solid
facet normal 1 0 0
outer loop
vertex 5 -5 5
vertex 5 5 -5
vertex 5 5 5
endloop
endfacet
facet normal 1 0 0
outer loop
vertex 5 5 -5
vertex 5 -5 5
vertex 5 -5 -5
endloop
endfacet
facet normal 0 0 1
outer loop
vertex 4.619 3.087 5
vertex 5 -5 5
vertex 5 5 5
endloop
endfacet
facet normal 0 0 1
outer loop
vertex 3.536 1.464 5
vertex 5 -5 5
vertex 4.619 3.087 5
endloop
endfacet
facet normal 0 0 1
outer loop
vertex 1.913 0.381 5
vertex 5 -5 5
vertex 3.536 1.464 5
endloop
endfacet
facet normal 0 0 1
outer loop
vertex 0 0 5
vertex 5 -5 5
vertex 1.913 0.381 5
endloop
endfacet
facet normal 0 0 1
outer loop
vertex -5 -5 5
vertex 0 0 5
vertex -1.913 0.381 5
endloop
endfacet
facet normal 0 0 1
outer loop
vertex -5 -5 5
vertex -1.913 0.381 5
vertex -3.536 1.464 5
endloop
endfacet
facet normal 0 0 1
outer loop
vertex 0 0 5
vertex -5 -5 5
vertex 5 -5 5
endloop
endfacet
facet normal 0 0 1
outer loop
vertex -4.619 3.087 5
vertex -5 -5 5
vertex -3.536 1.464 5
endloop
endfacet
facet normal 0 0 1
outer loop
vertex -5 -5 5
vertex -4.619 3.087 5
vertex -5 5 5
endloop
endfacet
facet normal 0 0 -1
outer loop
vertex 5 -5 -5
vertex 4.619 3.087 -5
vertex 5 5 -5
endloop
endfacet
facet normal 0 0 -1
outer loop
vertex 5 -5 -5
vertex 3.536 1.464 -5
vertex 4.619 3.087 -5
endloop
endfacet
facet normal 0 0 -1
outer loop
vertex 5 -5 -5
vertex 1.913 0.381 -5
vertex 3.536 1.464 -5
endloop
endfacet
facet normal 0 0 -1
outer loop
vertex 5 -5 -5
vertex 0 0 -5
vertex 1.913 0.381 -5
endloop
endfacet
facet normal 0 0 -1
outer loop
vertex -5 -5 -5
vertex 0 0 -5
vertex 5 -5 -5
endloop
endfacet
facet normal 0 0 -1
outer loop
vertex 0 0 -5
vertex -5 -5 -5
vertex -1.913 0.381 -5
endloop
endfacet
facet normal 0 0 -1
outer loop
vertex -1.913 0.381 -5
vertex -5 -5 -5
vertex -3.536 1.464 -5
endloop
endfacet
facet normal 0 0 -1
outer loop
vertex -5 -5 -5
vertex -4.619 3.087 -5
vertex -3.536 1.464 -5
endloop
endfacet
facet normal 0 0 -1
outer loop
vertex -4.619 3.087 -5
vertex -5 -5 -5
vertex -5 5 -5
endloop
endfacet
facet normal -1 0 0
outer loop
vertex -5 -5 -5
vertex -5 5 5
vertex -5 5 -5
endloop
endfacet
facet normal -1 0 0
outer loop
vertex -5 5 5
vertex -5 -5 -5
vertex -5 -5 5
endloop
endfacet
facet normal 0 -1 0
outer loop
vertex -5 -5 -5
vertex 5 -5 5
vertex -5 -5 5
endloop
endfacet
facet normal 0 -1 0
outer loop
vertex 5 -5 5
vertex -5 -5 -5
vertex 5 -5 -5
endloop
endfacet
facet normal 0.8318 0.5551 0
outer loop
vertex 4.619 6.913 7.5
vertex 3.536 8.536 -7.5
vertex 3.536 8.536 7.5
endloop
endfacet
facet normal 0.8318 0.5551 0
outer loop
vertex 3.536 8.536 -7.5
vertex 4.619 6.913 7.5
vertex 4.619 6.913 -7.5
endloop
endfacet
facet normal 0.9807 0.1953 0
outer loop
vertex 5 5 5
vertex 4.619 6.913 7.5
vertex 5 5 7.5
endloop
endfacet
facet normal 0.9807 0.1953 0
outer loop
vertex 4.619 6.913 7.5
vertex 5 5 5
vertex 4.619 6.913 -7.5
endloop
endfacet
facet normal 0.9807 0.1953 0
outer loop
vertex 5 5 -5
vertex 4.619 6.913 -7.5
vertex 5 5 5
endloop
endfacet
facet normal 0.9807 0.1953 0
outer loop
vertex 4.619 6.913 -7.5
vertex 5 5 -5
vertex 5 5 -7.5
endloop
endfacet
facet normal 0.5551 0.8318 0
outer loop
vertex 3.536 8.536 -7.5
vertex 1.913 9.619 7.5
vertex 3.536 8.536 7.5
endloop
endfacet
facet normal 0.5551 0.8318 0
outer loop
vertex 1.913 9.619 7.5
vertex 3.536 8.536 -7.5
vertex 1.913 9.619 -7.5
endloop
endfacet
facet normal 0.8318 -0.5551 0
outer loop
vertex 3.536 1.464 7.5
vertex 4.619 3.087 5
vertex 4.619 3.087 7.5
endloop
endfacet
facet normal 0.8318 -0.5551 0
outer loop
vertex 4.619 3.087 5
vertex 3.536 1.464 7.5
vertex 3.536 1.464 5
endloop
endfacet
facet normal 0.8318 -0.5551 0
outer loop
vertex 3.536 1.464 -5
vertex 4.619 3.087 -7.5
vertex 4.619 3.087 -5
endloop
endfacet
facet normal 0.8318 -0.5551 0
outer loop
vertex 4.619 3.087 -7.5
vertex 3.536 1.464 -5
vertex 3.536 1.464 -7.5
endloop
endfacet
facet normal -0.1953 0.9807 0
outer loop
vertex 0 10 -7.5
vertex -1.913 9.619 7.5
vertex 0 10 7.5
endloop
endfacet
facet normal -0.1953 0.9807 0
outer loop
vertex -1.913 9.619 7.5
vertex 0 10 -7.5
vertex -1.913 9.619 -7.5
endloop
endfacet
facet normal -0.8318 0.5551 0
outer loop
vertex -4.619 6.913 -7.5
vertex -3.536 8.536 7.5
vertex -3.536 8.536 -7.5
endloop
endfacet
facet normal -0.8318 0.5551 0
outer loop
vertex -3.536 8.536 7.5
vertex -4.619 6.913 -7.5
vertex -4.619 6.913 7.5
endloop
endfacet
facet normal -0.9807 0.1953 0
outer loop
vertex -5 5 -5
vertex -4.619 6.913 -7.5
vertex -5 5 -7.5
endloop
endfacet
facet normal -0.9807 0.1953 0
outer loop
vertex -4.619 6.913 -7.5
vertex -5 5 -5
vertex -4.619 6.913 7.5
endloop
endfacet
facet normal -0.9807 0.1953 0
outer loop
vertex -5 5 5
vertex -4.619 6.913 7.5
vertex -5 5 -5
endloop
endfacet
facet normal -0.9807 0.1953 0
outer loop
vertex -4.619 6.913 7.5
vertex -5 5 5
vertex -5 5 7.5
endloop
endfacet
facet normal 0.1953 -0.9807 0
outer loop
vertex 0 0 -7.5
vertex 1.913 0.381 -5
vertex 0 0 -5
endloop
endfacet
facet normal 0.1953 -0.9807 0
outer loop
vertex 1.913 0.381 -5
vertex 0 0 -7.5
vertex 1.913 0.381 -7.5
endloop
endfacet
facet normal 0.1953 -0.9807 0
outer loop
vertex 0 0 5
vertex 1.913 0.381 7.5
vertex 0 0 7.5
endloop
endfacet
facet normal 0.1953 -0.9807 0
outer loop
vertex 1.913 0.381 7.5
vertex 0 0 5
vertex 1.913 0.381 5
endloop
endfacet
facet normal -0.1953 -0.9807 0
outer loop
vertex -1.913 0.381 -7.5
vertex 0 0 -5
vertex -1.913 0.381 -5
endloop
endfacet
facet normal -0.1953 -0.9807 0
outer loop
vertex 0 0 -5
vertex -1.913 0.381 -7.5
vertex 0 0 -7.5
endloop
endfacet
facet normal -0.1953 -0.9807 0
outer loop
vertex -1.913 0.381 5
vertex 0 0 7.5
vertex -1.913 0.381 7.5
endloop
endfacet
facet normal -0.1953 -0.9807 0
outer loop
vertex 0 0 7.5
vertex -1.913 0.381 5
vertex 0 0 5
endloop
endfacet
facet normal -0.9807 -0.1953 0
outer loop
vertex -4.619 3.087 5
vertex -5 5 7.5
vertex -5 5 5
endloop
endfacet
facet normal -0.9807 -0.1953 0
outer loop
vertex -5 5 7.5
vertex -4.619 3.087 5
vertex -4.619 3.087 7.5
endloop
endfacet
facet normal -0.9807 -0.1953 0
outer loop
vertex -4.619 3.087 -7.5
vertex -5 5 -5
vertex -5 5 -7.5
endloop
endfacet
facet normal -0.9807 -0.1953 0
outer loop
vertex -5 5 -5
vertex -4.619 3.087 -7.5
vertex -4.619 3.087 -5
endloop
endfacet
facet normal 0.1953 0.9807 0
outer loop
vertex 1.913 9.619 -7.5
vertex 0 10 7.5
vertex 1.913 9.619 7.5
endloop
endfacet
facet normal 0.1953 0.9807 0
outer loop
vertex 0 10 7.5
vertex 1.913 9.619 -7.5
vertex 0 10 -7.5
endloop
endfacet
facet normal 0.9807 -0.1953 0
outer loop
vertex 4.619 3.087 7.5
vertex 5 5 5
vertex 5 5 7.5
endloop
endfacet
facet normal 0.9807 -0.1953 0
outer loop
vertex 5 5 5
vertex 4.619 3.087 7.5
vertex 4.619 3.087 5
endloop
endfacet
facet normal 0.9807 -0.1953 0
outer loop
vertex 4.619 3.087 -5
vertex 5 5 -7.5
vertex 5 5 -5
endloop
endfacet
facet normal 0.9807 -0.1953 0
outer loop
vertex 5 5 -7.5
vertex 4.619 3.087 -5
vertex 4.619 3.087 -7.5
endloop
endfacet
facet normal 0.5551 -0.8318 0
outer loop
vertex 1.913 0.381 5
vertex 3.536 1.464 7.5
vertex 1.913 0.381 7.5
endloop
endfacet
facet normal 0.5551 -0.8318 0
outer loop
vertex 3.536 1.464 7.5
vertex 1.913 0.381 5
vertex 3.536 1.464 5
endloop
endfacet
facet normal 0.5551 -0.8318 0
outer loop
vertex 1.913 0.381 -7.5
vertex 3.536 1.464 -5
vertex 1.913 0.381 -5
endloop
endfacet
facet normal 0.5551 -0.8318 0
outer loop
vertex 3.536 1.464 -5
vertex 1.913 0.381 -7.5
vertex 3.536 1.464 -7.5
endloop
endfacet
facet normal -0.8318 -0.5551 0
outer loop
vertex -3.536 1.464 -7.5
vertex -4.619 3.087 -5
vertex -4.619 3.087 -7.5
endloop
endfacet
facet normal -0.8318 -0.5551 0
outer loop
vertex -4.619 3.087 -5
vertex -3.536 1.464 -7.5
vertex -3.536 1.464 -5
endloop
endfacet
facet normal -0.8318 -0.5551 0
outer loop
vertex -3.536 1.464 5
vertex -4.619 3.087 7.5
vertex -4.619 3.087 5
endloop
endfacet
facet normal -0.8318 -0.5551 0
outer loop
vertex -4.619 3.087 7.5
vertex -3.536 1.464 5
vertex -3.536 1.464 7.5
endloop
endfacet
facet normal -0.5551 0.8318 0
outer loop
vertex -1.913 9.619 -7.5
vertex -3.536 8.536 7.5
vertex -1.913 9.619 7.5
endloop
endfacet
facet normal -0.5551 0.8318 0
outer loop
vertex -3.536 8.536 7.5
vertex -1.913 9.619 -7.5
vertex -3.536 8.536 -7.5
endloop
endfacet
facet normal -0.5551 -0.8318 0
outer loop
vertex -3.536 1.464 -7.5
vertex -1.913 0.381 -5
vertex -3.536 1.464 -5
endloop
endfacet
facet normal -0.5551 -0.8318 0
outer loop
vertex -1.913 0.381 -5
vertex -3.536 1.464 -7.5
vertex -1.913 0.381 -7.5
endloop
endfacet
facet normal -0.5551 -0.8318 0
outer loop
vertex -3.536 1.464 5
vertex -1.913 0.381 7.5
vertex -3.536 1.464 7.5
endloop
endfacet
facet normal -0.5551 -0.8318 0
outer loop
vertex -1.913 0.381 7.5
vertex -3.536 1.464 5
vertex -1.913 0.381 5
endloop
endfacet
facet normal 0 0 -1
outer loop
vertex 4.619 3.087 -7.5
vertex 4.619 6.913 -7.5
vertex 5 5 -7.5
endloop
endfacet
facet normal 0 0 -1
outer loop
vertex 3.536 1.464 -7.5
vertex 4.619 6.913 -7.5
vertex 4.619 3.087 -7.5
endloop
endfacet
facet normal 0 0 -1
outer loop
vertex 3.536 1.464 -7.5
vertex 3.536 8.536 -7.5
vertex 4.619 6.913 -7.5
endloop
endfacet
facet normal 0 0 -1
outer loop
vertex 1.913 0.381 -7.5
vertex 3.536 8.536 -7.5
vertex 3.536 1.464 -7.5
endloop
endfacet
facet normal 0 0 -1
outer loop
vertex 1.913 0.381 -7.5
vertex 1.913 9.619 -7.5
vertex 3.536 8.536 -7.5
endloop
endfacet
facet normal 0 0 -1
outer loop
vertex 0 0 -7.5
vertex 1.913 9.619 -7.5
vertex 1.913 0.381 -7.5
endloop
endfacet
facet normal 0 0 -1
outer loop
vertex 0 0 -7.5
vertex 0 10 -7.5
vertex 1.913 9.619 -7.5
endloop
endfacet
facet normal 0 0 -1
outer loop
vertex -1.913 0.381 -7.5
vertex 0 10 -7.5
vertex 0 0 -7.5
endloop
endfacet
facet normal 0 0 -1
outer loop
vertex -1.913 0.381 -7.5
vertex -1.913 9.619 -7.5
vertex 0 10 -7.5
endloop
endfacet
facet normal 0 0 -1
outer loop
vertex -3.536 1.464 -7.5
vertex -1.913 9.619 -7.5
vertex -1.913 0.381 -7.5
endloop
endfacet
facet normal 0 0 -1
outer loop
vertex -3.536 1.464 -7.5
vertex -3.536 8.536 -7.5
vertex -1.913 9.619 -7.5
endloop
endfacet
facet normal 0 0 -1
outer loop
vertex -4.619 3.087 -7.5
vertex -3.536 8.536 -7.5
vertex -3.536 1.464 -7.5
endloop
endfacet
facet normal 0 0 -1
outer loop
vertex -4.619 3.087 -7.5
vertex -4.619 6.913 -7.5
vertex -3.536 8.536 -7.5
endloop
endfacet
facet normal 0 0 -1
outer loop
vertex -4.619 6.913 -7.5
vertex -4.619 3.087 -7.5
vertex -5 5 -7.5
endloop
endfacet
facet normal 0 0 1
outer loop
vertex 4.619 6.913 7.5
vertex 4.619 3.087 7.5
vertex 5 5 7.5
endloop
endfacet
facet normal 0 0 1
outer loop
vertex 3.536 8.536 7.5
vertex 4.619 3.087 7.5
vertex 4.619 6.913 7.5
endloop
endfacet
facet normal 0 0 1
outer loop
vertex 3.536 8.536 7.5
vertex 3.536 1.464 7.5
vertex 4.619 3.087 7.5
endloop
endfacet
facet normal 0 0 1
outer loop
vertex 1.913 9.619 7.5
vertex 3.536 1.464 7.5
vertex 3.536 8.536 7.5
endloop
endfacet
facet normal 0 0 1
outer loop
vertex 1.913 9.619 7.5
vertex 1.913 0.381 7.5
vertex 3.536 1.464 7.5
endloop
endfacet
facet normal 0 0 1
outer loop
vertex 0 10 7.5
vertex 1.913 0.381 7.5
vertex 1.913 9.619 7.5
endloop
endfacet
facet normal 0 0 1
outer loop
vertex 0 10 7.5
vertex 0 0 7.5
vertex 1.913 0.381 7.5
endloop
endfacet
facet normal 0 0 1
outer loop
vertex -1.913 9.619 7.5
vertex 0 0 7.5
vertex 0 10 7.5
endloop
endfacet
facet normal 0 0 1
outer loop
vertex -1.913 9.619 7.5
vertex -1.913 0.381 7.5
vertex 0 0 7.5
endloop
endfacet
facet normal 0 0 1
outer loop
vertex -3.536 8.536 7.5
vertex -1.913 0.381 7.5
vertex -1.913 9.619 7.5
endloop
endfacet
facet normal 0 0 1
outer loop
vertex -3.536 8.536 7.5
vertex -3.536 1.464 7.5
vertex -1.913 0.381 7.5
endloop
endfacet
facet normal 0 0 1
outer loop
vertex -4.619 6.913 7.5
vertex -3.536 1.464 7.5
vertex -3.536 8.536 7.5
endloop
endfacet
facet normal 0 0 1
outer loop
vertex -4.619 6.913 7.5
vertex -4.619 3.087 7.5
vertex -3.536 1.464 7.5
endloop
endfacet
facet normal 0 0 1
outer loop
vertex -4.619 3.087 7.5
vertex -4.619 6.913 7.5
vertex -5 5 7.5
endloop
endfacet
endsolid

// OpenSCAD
// Size of the Cube (all directions)
cuSize = 10;

// The diameter of the Cylinder
cyDia = 10;

// The height of the Cylinder
cyHei = 15;

// Y-Translation of the Cylinder
tY = 5;

// Create Cube and move Cylinder by 'tY'
// You can put {} around the shape to translate
// It's optional if you translate only one shape
cube(size = [cuSize, cuSize, cuSize], center = true);
translate([0, tY, 0]){
    cylinder(d = cyDia, h = cyHei, center = true);
}
